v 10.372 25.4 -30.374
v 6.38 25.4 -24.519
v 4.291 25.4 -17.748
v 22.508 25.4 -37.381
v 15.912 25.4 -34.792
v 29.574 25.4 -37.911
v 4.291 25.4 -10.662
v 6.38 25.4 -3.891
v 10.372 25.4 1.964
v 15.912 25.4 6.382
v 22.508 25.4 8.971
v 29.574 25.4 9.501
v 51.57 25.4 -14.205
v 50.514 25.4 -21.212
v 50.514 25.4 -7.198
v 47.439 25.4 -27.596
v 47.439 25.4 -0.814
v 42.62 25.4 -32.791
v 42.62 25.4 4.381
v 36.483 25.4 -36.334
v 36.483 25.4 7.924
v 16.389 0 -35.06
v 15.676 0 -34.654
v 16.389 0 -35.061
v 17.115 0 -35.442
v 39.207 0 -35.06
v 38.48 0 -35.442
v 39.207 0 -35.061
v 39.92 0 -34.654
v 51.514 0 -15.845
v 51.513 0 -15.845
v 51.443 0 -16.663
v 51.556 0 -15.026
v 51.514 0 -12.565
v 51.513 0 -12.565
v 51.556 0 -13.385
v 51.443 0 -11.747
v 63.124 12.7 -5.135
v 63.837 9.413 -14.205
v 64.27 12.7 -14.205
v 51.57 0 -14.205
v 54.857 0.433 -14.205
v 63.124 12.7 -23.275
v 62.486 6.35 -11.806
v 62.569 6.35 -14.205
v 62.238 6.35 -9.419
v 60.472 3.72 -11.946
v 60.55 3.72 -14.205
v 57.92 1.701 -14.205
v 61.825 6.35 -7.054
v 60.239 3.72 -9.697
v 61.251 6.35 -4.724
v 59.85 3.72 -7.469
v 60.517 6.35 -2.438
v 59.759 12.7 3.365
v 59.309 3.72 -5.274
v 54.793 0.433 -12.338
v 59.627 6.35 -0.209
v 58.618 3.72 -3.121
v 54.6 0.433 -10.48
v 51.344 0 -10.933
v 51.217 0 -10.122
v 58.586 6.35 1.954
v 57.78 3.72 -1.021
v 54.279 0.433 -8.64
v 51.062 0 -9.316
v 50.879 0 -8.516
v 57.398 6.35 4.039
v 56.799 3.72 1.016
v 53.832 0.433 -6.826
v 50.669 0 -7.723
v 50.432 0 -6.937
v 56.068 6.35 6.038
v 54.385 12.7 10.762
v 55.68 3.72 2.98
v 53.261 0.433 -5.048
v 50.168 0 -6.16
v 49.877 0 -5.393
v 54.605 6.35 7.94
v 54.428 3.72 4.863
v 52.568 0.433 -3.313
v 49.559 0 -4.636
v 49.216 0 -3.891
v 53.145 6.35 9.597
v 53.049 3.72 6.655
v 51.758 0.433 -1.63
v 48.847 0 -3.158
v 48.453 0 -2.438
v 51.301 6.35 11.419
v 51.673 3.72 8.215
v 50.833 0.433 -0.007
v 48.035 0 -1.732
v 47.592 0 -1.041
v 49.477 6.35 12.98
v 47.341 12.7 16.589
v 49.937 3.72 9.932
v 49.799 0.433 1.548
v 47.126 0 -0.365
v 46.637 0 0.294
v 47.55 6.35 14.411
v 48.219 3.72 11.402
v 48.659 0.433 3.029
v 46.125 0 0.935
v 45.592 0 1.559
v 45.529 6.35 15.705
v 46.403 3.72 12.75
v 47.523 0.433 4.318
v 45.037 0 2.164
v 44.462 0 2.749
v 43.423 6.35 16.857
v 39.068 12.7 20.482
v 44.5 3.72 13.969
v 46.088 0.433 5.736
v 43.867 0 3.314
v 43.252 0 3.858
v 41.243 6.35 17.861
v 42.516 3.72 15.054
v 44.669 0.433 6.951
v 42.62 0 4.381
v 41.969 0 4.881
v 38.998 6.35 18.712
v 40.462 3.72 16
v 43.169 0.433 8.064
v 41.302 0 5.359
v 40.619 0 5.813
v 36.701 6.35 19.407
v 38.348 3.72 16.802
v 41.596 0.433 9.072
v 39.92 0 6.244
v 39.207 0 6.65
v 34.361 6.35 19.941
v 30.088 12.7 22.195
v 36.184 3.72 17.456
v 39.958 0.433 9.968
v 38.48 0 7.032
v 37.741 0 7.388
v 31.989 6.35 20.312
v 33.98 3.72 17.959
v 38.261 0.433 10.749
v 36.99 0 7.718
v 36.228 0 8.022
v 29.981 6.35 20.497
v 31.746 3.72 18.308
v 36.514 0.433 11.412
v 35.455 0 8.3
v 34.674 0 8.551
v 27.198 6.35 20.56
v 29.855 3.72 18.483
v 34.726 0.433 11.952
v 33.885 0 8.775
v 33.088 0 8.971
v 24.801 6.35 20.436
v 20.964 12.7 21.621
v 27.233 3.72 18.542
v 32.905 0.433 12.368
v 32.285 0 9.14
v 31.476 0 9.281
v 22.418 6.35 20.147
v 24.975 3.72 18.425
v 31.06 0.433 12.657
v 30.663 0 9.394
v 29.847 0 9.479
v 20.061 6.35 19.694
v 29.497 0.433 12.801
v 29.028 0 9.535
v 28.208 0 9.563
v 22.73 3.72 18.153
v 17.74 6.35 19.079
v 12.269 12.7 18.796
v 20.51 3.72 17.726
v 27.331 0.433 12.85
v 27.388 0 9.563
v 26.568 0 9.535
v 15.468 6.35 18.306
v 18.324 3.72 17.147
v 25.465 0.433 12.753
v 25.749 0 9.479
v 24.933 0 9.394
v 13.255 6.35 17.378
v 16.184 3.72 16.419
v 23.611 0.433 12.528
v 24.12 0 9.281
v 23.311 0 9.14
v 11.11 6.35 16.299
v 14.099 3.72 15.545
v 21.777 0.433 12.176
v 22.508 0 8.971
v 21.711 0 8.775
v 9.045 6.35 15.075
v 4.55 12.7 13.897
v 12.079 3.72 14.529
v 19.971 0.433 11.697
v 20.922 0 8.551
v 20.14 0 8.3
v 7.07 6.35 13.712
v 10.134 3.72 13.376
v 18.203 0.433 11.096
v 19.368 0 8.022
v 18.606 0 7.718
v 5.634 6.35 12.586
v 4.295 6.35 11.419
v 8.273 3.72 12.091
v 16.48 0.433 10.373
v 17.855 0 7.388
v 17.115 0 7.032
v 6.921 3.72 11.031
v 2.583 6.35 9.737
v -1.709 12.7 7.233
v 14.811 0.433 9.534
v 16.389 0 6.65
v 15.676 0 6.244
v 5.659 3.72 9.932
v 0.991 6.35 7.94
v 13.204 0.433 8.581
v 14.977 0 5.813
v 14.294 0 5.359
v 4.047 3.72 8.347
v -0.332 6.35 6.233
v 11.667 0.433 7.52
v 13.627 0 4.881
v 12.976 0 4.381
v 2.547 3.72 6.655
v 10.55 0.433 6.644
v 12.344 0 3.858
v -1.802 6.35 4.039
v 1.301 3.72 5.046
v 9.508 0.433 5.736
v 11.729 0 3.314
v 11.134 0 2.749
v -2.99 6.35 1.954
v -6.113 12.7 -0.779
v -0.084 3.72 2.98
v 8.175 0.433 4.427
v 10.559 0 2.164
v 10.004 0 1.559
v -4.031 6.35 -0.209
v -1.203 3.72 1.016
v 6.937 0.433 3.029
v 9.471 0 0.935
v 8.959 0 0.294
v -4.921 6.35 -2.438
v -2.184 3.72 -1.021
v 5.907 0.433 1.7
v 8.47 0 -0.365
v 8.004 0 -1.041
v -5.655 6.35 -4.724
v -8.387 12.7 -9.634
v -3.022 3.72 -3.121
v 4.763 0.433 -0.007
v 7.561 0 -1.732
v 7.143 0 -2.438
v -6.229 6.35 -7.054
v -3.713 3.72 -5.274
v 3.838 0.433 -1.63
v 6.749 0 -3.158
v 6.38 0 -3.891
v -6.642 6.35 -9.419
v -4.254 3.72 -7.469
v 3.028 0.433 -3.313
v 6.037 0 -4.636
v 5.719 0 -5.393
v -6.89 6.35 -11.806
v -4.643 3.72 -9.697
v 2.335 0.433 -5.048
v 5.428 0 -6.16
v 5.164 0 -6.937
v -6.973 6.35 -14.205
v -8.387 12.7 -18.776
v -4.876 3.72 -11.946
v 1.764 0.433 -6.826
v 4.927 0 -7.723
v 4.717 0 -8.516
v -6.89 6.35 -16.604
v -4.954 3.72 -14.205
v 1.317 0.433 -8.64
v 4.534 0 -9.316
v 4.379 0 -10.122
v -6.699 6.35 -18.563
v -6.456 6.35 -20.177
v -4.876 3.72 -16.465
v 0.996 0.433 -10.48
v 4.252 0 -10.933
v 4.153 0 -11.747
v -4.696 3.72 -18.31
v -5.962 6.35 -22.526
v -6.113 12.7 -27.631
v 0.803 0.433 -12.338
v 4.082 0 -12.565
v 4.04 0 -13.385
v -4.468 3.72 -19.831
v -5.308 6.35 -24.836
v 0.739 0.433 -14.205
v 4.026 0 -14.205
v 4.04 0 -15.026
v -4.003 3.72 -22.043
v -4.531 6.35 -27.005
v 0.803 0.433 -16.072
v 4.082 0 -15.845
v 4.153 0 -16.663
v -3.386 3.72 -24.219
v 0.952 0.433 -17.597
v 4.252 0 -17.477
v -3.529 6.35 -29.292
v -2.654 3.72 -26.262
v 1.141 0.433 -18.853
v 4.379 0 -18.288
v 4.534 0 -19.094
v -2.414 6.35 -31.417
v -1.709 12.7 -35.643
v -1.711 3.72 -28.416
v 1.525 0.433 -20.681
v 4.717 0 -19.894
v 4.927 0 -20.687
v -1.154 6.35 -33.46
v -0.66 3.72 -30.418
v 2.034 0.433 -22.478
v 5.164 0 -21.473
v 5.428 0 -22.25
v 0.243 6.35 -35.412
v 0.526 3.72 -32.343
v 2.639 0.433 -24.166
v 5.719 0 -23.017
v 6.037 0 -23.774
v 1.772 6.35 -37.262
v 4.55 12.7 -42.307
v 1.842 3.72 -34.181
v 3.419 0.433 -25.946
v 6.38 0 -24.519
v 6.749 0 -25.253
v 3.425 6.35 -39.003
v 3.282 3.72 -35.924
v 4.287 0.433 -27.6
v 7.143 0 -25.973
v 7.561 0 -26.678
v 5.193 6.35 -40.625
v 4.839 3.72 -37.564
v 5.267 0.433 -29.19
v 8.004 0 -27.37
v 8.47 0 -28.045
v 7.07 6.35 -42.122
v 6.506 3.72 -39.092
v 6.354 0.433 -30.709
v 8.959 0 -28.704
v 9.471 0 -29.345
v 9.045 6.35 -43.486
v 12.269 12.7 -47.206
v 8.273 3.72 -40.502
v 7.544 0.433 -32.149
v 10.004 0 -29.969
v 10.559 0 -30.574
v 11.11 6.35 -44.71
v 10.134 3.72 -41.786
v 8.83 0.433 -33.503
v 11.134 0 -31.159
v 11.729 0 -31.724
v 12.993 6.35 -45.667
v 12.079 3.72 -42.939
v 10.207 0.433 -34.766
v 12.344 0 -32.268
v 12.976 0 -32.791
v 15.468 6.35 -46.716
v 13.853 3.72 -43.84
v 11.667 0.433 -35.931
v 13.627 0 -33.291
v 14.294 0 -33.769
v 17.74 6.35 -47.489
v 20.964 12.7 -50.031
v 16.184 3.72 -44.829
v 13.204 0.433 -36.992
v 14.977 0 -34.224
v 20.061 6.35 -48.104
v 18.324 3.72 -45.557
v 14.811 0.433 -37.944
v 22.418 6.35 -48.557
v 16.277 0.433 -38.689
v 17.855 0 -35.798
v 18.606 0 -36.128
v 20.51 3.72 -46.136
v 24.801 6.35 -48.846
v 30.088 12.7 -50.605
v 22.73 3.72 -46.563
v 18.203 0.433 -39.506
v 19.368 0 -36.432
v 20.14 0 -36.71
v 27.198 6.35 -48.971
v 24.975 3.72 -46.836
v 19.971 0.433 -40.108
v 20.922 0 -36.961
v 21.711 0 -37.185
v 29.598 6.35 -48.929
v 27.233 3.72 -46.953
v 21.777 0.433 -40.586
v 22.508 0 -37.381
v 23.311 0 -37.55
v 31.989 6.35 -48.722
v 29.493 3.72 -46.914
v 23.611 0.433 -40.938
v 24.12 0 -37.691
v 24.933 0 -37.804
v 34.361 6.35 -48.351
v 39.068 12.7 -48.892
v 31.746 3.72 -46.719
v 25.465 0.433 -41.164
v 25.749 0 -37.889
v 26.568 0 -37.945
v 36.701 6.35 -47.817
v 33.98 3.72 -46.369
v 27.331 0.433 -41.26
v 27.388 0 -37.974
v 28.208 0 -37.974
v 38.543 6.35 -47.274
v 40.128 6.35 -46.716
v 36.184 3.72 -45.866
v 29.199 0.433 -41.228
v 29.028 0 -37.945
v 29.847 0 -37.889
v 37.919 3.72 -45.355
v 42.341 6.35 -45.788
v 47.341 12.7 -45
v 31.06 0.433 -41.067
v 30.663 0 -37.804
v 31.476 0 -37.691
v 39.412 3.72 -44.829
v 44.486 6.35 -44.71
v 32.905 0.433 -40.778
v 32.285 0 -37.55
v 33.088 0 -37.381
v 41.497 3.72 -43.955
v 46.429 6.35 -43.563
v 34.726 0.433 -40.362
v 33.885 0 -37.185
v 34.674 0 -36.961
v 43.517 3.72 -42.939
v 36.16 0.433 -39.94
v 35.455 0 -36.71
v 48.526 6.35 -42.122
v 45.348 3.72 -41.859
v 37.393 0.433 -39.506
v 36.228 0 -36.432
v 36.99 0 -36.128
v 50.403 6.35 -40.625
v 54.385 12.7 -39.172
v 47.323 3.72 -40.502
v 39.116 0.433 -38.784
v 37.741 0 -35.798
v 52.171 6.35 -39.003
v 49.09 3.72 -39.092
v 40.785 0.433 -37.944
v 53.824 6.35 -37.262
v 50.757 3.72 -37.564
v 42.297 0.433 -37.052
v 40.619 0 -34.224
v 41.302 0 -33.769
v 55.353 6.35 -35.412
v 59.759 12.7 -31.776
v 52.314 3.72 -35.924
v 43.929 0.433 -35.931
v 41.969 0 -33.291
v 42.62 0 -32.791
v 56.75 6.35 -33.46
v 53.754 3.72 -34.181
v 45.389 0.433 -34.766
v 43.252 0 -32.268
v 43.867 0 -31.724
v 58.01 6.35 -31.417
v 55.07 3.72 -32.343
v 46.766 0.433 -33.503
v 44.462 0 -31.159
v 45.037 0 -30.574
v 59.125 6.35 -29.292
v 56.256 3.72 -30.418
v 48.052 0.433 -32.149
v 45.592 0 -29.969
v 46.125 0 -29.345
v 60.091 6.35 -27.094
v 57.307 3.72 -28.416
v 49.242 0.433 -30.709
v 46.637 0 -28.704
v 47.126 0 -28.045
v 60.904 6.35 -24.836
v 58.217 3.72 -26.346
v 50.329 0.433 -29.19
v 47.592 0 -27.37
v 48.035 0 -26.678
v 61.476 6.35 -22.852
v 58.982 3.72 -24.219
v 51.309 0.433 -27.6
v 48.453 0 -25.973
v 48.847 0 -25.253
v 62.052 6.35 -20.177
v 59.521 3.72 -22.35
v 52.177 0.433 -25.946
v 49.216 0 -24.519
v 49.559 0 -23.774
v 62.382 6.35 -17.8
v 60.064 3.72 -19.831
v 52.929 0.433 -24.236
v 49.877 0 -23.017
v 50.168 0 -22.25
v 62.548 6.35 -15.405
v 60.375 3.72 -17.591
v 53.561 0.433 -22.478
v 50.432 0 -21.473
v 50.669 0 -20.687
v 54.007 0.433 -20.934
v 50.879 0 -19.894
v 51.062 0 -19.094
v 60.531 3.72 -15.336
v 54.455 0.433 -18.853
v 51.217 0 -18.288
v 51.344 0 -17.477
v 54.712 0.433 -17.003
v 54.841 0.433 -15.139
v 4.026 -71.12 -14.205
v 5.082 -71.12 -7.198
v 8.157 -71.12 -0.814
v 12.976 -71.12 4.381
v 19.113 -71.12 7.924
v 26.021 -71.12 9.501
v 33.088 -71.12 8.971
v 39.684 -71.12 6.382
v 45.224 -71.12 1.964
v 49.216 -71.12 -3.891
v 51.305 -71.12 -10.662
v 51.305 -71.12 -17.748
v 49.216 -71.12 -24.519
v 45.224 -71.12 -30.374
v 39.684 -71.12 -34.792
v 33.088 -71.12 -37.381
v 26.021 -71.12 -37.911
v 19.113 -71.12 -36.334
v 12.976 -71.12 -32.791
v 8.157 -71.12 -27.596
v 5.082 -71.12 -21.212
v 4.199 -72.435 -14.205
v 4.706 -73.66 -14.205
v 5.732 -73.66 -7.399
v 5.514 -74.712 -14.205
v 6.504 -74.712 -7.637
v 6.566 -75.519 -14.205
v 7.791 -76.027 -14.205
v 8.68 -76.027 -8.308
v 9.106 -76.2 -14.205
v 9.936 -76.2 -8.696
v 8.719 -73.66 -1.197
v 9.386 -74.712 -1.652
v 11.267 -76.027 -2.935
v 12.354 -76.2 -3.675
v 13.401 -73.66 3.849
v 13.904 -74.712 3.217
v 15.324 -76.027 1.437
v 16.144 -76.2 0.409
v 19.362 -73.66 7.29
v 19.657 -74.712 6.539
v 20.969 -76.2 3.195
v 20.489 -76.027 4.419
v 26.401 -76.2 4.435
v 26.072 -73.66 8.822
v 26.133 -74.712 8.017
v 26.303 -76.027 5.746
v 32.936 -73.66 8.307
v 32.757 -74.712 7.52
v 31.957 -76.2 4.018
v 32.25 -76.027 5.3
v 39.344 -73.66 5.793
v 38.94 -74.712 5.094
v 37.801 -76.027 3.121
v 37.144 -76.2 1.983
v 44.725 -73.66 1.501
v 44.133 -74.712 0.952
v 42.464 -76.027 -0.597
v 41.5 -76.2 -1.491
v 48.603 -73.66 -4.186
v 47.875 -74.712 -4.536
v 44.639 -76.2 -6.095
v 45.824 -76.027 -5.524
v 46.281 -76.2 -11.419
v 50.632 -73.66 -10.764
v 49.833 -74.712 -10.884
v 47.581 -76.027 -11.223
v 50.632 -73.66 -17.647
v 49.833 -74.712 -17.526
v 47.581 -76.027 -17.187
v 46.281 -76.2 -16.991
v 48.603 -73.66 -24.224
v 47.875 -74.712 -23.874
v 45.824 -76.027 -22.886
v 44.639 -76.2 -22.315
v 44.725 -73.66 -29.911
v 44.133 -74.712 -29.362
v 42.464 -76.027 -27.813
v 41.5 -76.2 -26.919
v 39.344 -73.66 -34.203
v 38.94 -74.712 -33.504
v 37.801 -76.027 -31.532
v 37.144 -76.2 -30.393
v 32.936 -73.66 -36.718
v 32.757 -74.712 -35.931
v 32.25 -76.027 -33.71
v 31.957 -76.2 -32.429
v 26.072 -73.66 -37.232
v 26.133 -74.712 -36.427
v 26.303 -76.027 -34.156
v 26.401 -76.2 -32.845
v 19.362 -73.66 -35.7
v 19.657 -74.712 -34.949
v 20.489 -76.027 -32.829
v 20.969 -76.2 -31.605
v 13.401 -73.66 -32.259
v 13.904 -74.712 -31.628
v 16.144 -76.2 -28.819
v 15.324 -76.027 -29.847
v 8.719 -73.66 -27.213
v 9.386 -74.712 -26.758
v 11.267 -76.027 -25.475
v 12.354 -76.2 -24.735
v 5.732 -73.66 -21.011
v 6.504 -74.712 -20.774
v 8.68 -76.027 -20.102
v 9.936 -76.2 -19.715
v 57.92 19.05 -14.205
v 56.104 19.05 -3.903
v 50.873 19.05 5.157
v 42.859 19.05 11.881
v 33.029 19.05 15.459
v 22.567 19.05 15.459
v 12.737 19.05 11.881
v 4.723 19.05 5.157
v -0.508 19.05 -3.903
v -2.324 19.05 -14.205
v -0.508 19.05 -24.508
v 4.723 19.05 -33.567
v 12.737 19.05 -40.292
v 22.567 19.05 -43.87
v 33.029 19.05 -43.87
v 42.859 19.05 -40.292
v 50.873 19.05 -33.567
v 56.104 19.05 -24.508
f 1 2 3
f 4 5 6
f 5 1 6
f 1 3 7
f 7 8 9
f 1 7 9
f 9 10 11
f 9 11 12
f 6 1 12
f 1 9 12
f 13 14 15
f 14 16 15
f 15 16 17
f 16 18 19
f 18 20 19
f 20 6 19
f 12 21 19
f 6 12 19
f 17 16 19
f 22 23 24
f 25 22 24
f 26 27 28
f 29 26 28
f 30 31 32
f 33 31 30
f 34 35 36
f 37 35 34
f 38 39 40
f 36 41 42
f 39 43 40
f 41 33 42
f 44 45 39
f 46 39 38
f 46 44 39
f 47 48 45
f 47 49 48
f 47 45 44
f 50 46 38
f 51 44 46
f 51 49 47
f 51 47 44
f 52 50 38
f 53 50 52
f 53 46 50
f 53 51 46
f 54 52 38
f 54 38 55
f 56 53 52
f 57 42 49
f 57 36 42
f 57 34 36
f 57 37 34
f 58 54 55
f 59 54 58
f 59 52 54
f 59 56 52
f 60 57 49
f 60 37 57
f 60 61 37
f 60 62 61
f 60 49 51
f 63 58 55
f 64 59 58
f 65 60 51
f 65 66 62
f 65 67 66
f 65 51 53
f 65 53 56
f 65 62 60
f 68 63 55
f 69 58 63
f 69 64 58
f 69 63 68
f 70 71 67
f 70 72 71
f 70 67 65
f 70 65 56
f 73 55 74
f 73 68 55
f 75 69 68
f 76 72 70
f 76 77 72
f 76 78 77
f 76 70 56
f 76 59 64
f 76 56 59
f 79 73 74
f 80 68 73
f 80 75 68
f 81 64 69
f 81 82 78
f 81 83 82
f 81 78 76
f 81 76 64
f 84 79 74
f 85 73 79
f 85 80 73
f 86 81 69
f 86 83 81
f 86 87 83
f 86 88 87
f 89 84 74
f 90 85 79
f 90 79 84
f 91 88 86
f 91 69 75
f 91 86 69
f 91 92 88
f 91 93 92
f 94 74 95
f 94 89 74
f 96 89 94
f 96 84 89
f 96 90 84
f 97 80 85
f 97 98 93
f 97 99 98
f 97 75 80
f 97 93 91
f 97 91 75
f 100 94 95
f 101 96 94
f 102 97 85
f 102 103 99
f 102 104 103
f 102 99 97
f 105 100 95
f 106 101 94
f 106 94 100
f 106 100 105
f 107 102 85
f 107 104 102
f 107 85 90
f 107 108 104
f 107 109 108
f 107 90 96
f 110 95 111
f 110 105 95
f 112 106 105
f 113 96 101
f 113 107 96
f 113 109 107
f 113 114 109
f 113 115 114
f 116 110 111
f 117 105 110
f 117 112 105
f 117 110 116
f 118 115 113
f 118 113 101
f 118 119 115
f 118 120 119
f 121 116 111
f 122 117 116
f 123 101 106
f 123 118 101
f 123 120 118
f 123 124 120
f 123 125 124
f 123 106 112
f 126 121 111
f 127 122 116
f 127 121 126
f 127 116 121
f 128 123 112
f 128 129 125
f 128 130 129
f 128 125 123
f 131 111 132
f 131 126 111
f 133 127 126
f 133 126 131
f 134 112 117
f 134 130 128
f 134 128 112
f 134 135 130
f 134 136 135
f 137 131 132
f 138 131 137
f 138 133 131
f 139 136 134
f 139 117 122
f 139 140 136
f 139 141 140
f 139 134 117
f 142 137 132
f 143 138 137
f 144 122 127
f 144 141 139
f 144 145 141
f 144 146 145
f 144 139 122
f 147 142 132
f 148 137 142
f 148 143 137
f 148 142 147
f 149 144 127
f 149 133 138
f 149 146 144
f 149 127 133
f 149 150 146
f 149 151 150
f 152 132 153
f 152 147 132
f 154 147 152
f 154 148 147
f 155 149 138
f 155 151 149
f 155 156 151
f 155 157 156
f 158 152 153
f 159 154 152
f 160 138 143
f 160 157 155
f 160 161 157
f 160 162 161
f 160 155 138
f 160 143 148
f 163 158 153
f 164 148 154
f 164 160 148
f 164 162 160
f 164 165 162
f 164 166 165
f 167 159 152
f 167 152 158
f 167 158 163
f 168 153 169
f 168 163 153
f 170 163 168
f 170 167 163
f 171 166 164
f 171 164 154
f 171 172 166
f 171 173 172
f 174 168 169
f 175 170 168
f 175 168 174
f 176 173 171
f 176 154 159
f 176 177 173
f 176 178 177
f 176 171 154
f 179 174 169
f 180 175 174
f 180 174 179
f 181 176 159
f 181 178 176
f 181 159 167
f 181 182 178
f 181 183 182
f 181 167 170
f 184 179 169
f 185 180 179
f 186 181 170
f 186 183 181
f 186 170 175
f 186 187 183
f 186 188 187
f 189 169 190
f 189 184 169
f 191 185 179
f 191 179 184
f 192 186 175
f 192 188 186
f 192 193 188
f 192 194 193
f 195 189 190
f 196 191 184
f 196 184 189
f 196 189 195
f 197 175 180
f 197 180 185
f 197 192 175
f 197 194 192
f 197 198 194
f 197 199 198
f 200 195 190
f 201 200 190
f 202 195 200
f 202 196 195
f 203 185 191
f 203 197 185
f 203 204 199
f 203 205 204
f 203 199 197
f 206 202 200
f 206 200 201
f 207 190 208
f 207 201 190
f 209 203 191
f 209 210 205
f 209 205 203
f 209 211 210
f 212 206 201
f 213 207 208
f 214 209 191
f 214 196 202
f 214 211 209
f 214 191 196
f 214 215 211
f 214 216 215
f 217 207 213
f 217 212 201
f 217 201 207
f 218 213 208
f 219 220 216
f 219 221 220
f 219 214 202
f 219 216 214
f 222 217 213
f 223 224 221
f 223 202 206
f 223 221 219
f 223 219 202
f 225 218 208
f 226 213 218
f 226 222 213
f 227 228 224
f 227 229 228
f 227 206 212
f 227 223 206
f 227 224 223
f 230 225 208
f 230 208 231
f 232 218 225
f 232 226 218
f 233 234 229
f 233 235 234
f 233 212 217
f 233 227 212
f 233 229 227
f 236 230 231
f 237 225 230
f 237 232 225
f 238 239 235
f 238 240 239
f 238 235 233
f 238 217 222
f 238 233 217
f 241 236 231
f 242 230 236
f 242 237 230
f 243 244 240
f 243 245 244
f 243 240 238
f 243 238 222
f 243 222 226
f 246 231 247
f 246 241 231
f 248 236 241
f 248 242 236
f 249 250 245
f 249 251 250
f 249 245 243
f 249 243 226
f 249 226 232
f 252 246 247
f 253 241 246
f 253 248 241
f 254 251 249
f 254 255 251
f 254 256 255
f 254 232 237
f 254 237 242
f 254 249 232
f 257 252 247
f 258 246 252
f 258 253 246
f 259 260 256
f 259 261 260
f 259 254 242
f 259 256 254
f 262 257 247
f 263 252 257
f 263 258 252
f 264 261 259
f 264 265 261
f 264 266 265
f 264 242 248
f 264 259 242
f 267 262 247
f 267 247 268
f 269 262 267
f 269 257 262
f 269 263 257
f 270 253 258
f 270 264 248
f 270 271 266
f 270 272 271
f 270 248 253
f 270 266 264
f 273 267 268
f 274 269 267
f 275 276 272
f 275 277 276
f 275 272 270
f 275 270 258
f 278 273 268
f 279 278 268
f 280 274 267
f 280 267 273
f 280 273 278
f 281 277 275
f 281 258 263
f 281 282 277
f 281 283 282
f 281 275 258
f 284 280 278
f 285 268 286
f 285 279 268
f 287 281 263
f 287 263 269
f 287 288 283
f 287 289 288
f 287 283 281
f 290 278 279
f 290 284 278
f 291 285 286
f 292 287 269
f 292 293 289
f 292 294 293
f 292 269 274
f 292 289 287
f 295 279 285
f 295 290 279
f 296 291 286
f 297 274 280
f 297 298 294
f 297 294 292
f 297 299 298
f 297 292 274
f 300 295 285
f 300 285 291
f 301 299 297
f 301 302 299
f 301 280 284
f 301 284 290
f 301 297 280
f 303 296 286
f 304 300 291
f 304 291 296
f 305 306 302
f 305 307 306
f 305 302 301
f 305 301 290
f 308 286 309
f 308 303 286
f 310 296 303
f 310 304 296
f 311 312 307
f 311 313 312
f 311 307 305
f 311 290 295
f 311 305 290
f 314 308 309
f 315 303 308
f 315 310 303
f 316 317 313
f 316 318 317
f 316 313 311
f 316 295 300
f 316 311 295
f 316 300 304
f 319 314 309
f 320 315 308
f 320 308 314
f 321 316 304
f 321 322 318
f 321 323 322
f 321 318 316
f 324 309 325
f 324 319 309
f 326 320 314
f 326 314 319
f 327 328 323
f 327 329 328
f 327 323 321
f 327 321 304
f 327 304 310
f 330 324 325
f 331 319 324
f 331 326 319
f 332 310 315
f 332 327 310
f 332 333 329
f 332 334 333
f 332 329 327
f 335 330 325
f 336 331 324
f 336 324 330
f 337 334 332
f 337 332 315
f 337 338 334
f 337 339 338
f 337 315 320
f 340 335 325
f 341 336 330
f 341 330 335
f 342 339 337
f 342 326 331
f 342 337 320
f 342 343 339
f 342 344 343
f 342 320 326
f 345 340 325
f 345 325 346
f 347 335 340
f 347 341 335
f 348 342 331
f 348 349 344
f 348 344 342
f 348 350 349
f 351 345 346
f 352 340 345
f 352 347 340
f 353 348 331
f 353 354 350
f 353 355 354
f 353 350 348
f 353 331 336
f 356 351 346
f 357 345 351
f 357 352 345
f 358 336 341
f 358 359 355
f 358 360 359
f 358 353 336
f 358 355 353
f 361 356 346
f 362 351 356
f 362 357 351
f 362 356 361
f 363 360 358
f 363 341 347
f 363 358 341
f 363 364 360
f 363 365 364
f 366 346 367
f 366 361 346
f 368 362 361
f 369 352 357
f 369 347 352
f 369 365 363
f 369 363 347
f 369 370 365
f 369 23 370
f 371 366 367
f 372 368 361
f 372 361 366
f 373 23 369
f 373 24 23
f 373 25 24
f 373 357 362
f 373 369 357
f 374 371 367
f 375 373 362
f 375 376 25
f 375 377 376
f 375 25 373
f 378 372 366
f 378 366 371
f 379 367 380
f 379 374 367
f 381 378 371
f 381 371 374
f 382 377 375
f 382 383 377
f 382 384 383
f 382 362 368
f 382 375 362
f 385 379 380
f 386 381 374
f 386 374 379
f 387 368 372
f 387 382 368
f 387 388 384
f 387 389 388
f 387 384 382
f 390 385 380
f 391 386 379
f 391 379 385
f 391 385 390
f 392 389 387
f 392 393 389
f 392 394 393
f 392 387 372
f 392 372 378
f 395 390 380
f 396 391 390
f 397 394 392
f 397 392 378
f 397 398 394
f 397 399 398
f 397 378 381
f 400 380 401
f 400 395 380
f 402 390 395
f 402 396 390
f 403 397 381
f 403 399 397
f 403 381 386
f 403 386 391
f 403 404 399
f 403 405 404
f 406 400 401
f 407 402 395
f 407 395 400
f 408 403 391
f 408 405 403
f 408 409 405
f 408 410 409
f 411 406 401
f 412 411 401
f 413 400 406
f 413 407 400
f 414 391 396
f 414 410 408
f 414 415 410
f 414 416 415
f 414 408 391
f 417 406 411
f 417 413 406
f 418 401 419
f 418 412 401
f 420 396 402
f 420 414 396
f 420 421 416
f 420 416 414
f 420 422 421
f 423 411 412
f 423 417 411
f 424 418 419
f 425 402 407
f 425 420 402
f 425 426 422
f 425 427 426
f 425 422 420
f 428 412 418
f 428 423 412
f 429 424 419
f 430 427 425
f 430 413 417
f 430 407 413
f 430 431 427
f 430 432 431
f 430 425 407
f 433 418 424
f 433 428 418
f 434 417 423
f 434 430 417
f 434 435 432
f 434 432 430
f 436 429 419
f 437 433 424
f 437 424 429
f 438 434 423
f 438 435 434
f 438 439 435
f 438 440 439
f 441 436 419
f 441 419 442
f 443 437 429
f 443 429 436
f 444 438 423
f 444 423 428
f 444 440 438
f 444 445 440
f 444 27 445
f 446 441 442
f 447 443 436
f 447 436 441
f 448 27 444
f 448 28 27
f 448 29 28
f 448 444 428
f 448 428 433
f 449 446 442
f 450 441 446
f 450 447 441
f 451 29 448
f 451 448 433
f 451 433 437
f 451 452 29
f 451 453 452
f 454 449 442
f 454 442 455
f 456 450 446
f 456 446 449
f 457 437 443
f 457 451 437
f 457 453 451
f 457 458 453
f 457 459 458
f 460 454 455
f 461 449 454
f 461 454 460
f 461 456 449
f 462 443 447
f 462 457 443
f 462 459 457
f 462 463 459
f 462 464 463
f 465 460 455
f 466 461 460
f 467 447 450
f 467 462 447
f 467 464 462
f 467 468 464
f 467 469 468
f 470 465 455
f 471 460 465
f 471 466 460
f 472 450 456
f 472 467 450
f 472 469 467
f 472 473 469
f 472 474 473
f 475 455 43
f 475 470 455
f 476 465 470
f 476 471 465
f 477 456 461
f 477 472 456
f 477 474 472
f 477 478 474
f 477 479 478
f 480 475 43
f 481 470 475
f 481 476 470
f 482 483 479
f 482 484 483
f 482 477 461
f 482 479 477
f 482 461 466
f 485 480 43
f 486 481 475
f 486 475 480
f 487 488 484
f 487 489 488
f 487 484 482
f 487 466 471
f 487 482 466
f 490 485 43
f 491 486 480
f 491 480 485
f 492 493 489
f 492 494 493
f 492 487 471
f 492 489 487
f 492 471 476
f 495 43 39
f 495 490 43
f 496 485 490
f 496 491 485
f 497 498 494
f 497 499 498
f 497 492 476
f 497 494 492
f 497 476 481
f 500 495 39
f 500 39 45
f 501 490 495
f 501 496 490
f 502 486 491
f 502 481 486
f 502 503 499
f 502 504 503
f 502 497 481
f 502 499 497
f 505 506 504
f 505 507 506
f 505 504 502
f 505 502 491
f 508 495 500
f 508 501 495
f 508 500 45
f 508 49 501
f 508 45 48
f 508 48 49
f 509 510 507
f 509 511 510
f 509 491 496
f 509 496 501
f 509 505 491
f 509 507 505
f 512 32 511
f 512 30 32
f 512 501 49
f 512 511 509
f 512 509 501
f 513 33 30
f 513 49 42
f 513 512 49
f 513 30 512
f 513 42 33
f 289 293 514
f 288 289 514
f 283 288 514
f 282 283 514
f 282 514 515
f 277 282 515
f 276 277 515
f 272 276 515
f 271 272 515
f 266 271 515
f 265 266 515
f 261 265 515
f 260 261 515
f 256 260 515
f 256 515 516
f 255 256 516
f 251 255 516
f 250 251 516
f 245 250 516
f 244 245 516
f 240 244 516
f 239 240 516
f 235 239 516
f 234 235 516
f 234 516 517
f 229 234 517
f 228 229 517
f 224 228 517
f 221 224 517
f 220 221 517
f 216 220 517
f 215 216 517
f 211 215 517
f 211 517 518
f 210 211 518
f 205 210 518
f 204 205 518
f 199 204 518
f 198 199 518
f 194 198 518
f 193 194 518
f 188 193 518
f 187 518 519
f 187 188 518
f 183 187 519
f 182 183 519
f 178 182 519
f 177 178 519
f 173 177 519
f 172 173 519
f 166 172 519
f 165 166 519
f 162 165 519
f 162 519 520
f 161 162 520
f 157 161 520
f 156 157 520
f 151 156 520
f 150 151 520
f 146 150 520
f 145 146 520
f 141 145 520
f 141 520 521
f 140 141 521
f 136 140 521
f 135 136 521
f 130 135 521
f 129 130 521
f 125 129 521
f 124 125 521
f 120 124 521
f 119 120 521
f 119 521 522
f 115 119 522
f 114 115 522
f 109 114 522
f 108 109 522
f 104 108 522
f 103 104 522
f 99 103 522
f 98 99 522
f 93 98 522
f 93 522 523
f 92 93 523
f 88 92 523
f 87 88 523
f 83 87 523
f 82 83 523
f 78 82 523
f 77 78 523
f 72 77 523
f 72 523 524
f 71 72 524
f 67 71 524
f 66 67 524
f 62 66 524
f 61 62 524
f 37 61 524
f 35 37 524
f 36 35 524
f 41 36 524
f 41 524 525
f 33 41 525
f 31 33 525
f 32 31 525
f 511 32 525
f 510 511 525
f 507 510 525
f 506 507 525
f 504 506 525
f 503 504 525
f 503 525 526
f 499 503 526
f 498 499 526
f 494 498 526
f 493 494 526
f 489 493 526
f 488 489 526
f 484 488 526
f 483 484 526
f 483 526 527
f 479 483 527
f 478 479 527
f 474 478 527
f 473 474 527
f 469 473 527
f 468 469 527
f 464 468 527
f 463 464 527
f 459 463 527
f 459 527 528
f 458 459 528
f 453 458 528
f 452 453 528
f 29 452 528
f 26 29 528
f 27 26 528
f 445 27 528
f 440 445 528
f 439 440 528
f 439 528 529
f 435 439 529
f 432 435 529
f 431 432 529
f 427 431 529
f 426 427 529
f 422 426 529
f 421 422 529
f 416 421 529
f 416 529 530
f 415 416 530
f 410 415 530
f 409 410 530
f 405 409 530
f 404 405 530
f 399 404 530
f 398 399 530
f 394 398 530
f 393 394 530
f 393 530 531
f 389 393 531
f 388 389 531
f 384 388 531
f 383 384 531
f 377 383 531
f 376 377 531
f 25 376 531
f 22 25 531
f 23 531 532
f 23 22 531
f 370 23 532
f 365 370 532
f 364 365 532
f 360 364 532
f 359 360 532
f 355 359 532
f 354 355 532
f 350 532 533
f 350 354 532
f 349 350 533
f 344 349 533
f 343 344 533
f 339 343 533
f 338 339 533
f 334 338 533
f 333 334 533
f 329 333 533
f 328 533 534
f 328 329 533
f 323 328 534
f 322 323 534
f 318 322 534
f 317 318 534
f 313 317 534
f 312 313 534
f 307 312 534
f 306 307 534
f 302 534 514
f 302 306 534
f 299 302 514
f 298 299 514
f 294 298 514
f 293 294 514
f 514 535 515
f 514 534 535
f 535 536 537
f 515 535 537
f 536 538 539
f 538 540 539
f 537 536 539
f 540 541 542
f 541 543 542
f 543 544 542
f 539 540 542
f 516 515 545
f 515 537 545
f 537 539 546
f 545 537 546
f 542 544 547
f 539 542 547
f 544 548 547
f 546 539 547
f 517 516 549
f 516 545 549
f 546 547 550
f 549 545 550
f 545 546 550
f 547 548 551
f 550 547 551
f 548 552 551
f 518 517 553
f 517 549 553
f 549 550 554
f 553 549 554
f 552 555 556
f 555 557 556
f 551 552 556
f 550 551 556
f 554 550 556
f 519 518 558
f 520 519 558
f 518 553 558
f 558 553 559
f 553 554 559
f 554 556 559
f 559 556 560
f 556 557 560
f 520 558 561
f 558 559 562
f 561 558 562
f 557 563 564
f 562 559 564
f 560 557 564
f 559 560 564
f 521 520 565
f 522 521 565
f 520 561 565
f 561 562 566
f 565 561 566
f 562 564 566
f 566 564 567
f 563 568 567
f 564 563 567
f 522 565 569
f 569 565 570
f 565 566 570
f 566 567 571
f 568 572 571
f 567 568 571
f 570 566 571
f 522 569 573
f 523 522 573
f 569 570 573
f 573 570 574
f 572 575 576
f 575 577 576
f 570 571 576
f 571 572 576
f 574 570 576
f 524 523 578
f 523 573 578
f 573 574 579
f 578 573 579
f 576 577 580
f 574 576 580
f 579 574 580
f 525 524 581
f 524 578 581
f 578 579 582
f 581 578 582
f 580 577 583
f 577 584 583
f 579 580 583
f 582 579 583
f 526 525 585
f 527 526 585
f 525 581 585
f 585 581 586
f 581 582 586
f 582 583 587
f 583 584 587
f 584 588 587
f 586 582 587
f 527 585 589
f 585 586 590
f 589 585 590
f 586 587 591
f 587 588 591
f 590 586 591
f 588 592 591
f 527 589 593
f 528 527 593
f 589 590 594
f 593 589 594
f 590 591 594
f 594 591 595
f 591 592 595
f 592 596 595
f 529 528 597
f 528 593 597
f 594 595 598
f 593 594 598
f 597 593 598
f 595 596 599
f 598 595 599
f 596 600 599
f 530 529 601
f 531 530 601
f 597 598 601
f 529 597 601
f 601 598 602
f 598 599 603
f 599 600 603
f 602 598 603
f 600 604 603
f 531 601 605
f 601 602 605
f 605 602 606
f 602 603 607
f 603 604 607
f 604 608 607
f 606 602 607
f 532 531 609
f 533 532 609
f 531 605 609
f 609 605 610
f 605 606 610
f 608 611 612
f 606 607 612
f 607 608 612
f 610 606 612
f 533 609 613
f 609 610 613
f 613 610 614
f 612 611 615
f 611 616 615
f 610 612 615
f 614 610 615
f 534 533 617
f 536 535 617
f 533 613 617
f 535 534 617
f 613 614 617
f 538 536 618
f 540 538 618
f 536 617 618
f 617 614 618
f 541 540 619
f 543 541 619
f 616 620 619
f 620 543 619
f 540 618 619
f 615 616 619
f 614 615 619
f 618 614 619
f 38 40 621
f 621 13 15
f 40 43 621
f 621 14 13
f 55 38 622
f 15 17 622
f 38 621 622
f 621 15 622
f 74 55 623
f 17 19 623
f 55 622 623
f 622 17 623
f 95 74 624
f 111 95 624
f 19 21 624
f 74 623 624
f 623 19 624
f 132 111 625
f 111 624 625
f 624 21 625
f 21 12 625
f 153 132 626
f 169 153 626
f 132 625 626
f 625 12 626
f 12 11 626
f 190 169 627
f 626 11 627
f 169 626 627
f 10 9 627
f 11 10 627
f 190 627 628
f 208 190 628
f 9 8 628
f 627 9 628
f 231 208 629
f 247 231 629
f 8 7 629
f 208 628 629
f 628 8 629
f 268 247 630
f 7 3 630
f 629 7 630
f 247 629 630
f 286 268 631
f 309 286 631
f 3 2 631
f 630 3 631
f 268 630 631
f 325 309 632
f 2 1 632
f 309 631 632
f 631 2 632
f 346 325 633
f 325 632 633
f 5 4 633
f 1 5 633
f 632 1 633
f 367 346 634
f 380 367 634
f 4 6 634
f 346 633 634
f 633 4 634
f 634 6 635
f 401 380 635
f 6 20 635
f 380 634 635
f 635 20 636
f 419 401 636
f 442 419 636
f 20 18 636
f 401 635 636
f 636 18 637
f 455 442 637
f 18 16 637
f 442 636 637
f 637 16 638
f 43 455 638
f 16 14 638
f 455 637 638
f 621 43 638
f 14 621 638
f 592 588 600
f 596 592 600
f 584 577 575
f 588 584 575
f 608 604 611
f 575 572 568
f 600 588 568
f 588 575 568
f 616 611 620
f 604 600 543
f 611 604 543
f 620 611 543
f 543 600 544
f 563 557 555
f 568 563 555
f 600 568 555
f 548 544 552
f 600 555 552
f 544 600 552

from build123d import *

# Parameters (mm, degrees)
F1_R     = 36.4721508719
F2_DEPTH = 25.399999693
F3_SIZE  = 12.7
F4_R     = 12.69999
F5_R     = 23.7721508719
F6_DEPTH = 101.6
F7_R     = 5.08


# Not quite as in the source:
# - a fillet or chamfer is up to 0.001 mm smaller than in the source, because OpenCascade refuses the exact size


with BuildPart() as f2:
    # F1 (on face) → F2 (new body)
    with BuildSketch(Plane.XZ):
        with Locations((27.7979820967, -14.2051279545)):
            Circle(F1_R)
    extrude(amount=-F2_DEPTH)

    # F3
    f3_edges = [f2.edges().sort_by_distance(p)[0] for p in [
        (-8.674169, 25.4, -14.205128),
    ]]
    chamfer(f3_edges, length=F3_SIZE)

    # F4 (radius 12.7 in the source; OpenCascade refuses exactly that, so slightly less here)
    f4_edges = [f2.edges().sort_by_distance(p)[0] for p in [
        (-8.674169, 0, -14.205128),
    ]]
    fillet(f4_edges, radius=F4_R)

    # F5 (on face) → F6 (join)
    with BuildSketch(Plane(origin=(0, 25.399999693, 0), x_dir=(-1, 0, 0), z_dir=(0, 1, 0))):
        with Locations((-27.7979820967, -14.2051279545)):
            Circle(F5_R)
    extrude(amount=-F6_DEPTH)

    # F7
    f7_edges = [f2.edges().sort_by_distance(p)[0] for p in [
        (51.570133, -76.2, -14.205128),
    ]]
    fillet(f7_edges, radius=F7_R)


solid = f2.part
